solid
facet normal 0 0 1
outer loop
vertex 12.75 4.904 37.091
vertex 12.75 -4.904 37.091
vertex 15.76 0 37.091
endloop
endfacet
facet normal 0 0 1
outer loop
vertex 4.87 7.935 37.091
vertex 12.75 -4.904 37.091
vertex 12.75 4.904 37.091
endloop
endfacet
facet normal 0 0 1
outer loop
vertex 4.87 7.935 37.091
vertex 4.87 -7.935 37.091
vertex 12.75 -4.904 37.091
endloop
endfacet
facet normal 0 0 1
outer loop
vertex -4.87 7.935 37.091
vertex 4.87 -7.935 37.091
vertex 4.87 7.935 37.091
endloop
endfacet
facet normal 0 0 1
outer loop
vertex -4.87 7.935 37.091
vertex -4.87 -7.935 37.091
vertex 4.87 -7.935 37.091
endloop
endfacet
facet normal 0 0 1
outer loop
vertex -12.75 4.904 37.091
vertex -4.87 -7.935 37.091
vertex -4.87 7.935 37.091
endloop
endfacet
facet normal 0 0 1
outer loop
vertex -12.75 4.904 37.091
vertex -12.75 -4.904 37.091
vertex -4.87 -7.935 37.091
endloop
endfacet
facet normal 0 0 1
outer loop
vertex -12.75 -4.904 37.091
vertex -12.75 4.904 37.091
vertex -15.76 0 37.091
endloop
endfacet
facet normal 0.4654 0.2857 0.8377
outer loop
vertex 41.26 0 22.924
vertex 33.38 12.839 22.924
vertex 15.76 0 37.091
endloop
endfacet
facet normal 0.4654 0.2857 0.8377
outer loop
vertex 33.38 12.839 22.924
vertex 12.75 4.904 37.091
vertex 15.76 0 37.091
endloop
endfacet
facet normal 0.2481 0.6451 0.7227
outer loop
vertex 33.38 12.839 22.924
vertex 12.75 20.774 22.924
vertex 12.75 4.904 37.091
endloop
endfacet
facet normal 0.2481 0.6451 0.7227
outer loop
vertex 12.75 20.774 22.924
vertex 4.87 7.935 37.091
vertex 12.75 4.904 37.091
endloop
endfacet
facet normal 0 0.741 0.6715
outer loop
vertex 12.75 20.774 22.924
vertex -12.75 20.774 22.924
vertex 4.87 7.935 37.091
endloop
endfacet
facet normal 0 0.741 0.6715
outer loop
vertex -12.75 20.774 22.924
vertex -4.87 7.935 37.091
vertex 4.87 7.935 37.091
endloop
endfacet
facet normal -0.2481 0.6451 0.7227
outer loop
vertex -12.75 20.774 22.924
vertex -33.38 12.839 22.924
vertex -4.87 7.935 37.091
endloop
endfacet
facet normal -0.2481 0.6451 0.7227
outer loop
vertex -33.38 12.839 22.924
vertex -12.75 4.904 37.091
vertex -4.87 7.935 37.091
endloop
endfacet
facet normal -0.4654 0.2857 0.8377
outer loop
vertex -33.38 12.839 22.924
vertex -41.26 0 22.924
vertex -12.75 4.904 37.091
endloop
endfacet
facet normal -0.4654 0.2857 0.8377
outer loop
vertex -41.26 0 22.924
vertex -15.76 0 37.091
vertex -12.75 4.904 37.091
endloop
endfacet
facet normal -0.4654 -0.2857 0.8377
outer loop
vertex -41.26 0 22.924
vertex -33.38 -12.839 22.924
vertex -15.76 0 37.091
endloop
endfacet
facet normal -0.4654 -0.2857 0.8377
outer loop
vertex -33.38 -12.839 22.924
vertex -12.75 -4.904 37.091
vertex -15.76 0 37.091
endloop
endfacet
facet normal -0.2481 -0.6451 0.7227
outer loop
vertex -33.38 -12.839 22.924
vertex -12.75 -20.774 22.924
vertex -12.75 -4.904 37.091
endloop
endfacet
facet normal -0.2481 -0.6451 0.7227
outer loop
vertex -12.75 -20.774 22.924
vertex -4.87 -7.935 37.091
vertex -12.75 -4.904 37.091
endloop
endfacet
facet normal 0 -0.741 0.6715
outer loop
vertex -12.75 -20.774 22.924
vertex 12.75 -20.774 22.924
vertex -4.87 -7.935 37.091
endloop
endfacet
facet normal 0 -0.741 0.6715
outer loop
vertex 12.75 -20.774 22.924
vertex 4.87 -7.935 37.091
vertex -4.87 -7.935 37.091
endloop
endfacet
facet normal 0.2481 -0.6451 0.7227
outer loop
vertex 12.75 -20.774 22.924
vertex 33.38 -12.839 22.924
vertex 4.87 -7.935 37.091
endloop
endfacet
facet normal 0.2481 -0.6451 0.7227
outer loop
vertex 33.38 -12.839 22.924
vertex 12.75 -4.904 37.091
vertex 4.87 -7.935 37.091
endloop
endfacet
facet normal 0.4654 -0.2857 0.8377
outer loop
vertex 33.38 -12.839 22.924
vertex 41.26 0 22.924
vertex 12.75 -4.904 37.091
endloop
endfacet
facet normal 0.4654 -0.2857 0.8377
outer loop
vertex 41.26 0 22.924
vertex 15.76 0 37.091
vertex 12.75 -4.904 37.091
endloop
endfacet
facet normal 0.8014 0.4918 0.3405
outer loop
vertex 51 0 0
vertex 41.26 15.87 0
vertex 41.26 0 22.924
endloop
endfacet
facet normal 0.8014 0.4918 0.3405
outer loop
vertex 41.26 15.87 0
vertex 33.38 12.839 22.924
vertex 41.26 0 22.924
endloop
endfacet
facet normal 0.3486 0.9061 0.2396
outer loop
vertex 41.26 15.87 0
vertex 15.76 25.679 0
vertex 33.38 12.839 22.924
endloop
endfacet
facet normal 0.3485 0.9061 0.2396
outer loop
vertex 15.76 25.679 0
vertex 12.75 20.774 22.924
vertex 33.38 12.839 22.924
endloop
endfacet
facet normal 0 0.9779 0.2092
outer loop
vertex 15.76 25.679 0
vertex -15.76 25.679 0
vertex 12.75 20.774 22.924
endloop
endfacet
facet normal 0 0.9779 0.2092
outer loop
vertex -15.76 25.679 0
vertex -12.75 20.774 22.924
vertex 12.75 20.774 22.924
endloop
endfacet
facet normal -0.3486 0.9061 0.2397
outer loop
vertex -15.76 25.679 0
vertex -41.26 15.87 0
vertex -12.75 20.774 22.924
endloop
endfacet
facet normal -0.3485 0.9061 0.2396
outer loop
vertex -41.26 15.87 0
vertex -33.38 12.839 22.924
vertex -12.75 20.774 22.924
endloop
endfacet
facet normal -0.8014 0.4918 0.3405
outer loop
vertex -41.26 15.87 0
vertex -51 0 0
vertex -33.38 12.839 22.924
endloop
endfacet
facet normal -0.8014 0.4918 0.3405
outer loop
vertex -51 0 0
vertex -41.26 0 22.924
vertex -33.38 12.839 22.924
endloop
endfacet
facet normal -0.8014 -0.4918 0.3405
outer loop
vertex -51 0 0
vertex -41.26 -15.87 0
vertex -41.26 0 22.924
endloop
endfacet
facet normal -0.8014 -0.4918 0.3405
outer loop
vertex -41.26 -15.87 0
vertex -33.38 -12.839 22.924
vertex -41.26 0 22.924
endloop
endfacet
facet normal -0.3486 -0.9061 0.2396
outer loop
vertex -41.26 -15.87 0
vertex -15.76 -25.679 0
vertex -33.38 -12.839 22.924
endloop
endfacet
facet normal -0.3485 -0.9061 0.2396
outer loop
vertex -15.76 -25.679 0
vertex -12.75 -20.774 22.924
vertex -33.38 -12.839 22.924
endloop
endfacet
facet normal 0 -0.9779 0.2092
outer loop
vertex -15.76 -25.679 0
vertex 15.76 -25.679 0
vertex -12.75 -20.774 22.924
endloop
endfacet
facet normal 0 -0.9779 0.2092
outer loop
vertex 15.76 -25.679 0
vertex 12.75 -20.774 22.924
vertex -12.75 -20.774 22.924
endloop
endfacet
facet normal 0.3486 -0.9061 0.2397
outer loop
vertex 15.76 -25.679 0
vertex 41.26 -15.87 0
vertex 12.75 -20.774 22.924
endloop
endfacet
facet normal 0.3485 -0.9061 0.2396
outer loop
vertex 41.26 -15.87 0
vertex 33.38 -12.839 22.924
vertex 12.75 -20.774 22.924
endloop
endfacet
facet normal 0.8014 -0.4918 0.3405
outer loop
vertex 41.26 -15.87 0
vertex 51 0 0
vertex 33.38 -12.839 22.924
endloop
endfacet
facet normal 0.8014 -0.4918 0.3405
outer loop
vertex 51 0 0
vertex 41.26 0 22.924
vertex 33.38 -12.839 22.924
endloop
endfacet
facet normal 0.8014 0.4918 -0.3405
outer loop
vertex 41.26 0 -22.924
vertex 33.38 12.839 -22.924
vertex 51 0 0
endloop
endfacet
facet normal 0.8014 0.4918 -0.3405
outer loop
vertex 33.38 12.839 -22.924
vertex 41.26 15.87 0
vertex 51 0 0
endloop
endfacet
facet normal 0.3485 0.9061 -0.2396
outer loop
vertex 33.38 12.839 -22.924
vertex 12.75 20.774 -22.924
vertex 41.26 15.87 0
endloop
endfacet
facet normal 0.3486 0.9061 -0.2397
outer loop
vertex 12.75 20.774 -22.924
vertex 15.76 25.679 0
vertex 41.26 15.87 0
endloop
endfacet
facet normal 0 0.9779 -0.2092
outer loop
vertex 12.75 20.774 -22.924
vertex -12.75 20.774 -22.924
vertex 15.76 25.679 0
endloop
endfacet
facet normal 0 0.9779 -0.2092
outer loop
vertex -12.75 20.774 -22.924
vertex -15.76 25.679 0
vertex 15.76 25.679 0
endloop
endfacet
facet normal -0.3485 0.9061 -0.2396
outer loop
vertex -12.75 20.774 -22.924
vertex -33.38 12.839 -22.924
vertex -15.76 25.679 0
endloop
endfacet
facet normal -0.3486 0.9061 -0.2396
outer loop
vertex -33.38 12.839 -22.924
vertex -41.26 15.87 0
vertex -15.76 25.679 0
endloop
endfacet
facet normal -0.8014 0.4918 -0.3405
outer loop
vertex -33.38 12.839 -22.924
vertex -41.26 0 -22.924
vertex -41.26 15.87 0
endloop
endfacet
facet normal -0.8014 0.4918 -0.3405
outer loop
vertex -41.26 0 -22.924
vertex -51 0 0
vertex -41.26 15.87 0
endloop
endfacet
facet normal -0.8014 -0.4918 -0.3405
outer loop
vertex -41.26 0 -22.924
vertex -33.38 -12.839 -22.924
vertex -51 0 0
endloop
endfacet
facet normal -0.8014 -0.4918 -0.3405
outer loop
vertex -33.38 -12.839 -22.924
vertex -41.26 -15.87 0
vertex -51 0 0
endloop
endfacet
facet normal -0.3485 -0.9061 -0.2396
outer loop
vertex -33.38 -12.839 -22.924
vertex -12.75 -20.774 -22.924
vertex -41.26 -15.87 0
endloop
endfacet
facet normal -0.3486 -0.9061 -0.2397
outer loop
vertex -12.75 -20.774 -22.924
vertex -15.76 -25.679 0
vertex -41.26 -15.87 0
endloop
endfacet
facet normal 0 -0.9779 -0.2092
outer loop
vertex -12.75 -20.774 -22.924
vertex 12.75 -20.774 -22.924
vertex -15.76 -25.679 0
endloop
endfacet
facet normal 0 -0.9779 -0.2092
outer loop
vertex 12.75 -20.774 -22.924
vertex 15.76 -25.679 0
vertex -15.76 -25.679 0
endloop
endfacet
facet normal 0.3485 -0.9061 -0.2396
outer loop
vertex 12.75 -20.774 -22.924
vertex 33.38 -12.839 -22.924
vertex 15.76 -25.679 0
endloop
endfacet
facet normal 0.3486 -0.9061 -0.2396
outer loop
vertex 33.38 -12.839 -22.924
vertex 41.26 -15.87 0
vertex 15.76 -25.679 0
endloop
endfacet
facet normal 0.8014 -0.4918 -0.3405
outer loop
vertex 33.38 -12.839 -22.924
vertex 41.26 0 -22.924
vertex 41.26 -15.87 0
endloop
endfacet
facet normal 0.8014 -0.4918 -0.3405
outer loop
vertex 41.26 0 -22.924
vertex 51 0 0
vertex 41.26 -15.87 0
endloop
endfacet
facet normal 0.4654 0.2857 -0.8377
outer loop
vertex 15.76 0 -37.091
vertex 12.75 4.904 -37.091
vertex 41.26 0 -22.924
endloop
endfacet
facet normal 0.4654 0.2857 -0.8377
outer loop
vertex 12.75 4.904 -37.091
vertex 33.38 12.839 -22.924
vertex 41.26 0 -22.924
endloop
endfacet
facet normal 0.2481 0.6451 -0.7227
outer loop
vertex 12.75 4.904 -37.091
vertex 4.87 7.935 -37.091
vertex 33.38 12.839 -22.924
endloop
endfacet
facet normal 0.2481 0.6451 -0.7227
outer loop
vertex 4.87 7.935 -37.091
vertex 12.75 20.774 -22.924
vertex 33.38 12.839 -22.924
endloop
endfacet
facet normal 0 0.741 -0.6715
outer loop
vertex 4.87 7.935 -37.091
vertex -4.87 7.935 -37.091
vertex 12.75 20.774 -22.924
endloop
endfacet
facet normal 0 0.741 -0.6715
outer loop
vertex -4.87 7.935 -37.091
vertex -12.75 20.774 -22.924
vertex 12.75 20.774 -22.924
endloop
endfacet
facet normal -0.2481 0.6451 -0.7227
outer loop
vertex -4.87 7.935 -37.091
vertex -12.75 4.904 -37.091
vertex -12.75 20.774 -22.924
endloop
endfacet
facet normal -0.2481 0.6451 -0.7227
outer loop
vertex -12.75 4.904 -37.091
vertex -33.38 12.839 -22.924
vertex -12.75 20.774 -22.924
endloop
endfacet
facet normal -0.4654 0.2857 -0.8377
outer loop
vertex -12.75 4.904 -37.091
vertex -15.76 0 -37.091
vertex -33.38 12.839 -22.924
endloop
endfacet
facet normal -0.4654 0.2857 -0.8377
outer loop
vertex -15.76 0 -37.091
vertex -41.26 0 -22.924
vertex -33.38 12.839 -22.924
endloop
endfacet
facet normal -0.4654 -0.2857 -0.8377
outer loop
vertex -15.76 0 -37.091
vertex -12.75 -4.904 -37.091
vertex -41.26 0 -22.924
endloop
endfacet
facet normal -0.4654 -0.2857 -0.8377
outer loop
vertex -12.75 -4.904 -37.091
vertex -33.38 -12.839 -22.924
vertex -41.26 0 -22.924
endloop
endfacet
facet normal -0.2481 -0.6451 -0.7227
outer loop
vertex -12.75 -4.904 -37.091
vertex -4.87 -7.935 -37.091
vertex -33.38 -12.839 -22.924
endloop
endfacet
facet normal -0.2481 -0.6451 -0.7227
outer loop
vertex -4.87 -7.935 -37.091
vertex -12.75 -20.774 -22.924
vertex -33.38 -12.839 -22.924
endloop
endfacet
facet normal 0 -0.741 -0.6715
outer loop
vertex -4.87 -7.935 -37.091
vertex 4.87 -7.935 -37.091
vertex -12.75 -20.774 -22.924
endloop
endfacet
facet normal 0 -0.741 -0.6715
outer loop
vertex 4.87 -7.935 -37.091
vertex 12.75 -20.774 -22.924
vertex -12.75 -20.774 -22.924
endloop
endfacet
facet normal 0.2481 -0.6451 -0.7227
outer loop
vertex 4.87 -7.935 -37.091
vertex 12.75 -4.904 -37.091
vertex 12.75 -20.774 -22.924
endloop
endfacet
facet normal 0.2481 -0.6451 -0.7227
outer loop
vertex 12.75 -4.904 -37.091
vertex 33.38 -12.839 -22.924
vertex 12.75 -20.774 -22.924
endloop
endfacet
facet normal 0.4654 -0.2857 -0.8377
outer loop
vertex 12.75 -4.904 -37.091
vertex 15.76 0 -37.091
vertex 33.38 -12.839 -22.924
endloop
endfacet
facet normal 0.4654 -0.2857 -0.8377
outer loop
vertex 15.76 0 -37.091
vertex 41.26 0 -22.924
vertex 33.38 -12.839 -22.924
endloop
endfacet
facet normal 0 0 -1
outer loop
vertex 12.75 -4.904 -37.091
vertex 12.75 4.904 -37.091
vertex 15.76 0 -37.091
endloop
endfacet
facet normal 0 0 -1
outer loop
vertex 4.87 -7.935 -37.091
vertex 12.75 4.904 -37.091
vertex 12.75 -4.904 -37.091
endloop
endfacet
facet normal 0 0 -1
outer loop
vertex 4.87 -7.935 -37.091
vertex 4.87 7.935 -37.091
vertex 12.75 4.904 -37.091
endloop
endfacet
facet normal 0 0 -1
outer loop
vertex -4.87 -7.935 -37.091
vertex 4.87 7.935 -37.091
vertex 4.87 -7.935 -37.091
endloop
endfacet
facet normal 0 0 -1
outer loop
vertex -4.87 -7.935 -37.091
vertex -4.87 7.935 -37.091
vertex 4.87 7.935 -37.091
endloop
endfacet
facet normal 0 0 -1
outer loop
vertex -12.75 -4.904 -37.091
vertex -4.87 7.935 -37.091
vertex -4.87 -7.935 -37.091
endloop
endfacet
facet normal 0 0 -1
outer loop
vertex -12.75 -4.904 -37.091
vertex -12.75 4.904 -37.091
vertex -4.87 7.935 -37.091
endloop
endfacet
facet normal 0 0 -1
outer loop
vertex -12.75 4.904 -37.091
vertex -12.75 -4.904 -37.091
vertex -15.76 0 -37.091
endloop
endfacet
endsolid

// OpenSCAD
// Generated by SolidPython 1.0.1 on 2020-07-29 00:46:53


scale(v = [17, 9, 13]) {
	sphere(r = 3);
}
/***********************************************
*********      SolidPython code:      **********
************************************************
 
# import packages: SolidPython
from solid import *
from solid.utils import *
from itertools import chain, combinations, permutations


class Resize:

    def __init__(self, scad_file):
        self.scad_file = scad_file
        #self.scad_file = import_scad(scad_file)
        # cone/cylinder param:
        self.r1 = 0
        self.r2 = 0
        self.h = 0
        # rectangular prism param:
        self.w = 0
        self.l = 0
        # ellipse param:
        self.r = 0

    # import OpenScad code (file name corresponds to shape)


    # classify shape + parameters
    def assign(self, param1, param2, param3):
        if self.scad_file == 'cone.scad':
            self.r1 = param1
            self.r2 = param2
            self.h = param3
        elif self.scad_file == 'cylinder.scad':
            self.r1 = param1
            self.r2 = param2
            self.h = param3
        elif self.scad_file == 'rectangularPrism.scad':
            self.h = param1
            self.l = param2
            self.w = param3
        else:
            self.r = param1
            self.h = param2

    # resize parameters
    def iterate(self):
        x = range(3, 20, 2)
        i = 1
        if self.scad_file == 'cone.scad':
            tempList = list(permutations(x, 2))
            for temp in tempList:
                param1 = temp[0]
                param2 = temp[1]
                filepath = 'produced_scad_files/' + 'cone' + str(param1) + '_' + str(param2) + '_' + '.scad'
                scad_render_to_file(cylinder(h=param1, r1=param2, r2=0), filepath)

        elif self.scad_file == 'cylinder.scad':
            tempList = list(permutations(x, 3))
            for temp in tempList:
                param1 = temp[0]
                param2 = temp[1]
                filepath = 'produced_scad_files/' + 'cylinder' + str(param1) + '_' + str(param2) + '_' + '.scad'
                scad_render_to_file(cylinder(h=param1, r1=param2, r2=param2), filepath)

        elif self.scad_file == 'rectangularPrism.scad':
            tempList = list(permutations(x, 3))
            for temp in tempList:
                param1 = temp[0]
                param2 = temp[1]
                param3 = temp[2]
                filepath = 'produced_scad_files/' + 'rectangularPrism' + str(param1) + '_' + str(param2) + '_' + str(
                    param3) + '.scad'
                scad_render_to_file(cube(size=(param1, param2, param3)), filepath)

        elif self.scad_file == 'ellipse.scad':
            tempList = list(permutations(x, 4))
            for temp in tempList:
                param1 = temp[0]
                param2 = temp[1]
                param3 = temp[2]
                param4 = temp[3]
                filepath = 'produced_scad_files/' + 'ellipse' + str(param1) + '_' + str(param2) + '_' + str(param3) + '_' + str(param4) + '.scad'
                scad_render_to_file(scale([param1, param2, param3])(sphere(r=param4)), filepath)

    def render_to_scadfile(self):
        scad_render_to_file(scad, 'example.scad') 
 
************************************************/
